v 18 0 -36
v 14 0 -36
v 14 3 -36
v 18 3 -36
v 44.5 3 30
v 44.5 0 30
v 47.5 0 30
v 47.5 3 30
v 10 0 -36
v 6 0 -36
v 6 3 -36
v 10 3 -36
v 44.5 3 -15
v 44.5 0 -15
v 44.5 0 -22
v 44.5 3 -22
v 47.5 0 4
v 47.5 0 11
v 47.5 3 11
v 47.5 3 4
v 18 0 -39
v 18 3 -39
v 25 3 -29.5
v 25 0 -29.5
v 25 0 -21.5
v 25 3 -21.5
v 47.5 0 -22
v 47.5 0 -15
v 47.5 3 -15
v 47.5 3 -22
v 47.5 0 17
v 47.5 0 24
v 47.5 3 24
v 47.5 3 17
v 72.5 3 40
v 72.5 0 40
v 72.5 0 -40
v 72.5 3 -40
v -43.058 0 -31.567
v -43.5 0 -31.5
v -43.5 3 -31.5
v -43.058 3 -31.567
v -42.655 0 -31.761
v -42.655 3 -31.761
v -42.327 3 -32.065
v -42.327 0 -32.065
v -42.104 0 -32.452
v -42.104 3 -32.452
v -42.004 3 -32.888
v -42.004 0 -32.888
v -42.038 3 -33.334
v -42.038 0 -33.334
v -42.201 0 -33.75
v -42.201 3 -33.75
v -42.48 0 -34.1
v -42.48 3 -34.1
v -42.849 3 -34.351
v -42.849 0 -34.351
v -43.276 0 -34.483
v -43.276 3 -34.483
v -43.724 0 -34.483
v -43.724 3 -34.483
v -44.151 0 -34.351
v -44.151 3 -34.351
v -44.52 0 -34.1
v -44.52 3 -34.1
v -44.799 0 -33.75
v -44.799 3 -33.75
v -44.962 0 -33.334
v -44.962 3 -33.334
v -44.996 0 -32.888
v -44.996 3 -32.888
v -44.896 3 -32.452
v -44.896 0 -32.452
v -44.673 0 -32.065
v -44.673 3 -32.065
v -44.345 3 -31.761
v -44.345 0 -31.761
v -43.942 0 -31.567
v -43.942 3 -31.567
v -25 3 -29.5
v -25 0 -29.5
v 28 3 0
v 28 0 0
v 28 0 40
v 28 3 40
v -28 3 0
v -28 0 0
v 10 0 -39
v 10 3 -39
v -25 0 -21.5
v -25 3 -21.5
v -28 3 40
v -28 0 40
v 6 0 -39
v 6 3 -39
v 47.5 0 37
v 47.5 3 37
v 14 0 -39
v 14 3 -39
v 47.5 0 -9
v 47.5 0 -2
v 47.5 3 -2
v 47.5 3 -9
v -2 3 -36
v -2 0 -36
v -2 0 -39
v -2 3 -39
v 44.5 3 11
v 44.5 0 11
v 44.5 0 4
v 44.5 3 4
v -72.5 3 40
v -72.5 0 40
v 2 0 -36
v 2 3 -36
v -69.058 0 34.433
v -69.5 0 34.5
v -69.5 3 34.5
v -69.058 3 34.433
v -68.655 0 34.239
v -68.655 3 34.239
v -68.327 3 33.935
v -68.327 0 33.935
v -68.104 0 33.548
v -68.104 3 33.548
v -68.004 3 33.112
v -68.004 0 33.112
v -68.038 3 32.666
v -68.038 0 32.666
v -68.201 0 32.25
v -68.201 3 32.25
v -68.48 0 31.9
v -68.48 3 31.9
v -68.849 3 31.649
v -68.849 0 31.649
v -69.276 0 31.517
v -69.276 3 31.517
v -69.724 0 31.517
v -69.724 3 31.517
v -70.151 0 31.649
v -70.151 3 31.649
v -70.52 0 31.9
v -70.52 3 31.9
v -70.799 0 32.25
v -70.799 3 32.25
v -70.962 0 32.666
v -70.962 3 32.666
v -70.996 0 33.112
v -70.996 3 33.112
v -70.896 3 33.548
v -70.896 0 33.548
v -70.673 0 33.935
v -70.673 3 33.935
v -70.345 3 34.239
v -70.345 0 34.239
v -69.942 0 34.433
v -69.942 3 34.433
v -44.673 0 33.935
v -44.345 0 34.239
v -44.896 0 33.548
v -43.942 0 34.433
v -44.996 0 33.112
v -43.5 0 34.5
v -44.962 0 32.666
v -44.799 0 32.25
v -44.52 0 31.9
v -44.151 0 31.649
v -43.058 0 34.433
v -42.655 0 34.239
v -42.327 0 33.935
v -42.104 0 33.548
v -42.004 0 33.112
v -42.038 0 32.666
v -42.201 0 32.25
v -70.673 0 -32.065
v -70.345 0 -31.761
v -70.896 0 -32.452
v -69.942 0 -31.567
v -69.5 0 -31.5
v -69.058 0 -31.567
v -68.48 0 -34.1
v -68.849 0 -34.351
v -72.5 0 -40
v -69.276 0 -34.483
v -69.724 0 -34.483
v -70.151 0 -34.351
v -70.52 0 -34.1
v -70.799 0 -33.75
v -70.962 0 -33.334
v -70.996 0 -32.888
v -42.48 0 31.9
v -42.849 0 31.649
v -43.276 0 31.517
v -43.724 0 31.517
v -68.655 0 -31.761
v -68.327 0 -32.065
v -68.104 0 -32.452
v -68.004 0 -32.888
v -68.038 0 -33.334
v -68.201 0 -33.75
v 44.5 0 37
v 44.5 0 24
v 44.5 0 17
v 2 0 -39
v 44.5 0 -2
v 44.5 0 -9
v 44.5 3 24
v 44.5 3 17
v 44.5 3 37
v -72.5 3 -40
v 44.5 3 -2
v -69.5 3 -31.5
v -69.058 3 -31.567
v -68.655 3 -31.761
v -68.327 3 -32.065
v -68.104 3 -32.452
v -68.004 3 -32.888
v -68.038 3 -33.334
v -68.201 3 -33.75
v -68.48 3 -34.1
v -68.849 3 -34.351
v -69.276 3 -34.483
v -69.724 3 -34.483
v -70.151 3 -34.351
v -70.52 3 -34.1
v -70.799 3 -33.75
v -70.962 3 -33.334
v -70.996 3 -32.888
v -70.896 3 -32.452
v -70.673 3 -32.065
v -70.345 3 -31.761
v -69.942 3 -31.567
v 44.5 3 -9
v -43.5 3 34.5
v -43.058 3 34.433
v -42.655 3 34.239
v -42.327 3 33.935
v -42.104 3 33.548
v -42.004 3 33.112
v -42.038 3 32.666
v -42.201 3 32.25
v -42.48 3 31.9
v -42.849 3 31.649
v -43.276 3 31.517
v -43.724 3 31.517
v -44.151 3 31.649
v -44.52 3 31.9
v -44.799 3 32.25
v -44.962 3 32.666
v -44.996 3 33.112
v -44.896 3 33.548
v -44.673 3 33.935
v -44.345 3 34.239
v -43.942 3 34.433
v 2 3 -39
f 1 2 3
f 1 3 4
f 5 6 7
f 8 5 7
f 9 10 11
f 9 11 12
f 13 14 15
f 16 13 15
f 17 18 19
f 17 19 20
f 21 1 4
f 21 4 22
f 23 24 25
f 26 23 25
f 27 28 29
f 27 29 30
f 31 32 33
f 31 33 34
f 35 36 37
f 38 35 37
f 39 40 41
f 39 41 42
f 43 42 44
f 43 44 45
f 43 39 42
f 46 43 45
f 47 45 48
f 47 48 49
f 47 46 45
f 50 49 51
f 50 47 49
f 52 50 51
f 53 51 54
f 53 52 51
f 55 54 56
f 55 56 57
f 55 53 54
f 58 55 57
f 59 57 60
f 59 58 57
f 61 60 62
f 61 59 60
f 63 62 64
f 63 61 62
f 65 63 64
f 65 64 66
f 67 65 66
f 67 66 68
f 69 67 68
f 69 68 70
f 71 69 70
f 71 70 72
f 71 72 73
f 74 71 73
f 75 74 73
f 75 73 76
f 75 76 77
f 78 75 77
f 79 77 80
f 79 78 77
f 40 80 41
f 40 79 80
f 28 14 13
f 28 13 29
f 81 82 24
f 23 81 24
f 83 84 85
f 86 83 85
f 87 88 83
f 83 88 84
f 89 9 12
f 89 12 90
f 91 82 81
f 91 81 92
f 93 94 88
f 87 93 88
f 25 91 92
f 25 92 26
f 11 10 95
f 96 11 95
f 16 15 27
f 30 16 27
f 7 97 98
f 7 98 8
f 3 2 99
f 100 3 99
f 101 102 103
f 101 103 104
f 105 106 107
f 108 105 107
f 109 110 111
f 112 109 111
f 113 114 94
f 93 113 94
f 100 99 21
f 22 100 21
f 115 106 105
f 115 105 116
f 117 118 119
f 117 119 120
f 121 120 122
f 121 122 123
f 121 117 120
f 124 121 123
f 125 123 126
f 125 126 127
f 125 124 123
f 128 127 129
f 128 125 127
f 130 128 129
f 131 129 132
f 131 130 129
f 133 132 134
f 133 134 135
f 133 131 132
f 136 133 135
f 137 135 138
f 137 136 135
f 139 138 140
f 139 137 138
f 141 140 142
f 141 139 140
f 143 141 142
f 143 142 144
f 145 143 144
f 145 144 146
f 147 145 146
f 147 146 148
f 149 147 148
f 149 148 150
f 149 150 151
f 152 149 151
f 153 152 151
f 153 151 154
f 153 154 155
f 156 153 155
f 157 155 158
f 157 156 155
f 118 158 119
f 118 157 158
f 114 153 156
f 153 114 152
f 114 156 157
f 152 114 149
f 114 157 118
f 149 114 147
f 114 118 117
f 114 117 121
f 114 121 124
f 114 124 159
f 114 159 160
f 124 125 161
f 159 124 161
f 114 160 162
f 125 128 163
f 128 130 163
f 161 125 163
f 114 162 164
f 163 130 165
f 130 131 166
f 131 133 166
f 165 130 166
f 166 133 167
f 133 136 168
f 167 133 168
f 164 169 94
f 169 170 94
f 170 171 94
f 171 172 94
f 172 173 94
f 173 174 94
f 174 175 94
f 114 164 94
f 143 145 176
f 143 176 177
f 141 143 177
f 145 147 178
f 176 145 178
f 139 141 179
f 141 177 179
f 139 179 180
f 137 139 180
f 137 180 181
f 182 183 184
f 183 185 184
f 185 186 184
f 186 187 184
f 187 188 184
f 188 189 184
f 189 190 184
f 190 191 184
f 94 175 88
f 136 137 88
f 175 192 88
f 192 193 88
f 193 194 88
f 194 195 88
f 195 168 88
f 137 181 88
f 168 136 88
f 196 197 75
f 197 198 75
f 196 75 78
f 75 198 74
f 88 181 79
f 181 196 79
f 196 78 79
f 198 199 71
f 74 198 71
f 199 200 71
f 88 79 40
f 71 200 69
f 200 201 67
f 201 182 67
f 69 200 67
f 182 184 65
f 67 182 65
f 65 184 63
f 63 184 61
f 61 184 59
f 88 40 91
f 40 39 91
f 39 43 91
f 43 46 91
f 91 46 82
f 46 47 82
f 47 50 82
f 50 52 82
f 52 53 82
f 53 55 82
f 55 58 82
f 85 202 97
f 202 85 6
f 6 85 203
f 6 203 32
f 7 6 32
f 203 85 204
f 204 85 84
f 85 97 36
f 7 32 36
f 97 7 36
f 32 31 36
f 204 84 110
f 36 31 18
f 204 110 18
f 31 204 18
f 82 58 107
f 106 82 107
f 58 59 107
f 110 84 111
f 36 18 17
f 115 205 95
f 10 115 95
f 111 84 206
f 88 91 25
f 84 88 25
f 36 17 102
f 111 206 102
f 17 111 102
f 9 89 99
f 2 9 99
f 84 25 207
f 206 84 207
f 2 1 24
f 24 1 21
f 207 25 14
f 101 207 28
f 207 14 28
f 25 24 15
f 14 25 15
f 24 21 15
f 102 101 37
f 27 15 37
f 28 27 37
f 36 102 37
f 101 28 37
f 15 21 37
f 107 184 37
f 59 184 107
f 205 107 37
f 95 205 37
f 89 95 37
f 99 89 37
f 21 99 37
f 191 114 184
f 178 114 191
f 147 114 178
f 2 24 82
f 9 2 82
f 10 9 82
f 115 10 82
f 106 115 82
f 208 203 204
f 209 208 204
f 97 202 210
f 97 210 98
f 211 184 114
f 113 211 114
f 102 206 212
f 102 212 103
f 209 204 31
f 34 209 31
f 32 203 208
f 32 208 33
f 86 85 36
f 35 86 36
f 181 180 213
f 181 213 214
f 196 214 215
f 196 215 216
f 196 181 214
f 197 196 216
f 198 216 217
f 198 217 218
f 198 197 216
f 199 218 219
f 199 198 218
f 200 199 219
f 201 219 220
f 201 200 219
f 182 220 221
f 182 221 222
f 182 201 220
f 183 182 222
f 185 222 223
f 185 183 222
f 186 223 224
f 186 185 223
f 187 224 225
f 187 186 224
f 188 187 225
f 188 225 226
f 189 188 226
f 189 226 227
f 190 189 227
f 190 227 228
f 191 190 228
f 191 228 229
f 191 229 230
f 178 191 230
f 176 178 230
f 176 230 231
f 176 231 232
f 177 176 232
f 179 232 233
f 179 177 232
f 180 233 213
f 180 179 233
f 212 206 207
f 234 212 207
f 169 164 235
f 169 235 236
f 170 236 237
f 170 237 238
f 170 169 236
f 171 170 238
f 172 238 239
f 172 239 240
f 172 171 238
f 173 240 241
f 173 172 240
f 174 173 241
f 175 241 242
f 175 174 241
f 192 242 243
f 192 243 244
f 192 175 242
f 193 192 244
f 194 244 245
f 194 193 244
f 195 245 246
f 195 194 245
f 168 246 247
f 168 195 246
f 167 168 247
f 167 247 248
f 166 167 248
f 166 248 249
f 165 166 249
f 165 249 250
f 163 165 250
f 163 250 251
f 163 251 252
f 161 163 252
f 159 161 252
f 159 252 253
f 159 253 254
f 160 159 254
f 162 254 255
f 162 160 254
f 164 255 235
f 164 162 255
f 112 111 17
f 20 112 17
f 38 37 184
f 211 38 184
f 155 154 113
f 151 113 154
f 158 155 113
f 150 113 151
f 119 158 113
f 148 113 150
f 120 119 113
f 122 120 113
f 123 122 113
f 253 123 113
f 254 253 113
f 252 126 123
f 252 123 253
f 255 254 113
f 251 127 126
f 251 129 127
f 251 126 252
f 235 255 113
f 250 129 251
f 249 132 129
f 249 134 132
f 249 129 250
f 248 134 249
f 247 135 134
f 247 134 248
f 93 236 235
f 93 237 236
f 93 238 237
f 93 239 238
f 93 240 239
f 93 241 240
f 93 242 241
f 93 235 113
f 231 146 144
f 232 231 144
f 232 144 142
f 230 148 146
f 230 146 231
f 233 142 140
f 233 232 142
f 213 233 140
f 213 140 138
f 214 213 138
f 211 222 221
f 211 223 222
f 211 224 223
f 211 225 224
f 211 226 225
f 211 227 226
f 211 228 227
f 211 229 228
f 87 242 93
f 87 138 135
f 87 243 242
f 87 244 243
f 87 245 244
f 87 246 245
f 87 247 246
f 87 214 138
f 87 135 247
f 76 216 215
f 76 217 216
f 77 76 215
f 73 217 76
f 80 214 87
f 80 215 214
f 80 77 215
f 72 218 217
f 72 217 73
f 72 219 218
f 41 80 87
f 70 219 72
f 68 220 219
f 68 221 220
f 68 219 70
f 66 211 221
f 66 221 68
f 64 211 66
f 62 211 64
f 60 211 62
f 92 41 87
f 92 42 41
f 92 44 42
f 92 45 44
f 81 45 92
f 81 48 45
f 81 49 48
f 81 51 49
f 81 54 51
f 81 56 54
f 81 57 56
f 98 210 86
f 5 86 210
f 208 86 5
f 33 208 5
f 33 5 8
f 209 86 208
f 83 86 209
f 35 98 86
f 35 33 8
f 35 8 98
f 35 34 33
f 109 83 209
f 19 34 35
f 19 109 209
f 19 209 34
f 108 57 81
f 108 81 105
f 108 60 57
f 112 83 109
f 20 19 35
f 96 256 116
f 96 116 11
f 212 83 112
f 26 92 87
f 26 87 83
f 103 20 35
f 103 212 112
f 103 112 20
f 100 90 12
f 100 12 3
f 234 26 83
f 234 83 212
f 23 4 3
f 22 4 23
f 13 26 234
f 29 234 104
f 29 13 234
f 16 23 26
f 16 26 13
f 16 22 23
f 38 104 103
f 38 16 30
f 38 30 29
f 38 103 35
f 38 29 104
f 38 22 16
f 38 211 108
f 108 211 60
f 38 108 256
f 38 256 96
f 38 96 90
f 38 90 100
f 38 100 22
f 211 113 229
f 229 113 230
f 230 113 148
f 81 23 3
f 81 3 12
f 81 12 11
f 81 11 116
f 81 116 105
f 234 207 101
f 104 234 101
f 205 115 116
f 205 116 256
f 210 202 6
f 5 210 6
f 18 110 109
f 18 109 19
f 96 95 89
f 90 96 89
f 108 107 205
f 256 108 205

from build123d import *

# Parameters (mm, degrees)
SKETCH1_R           = 1.5
SKETCH1_W           = 3
SKETCH1_H           = 7
SKETCH1_W_2         = 4
SKETCH1_H_2         = 3
BOSS_EXTRUDE1_DEPTH = 3
SKETCH5_W           = 50
SKETCH5_H           = 8
CUT_EXTRUDE1_DEPTH  = 10


with BuildPart() as part:
    # Sketch1 → Boss-Extrude1 (new body)
    with BuildSketch(Plane(origin=(0, 0, 0), x_dir=(1, 0, 0), z_dir=(0, 1, 0))):
        Polygon((-72.5, -40), (-28, -40), (-28, 0), (28, 0), (28, -40), (72.5, -40), (72.5, 40), (-72.5, 40), align=None)
        with Locations(Location((-69.5, 33, 0), (0, 0, 270))):
            Circle(SKETCH1_R, mode=Mode.SUBTRACT)
        with Locations(Location((-43.5, 33, 0), (0, 0, 270))):
            Circle(SKETCH1_R, mode=Mode.SUBTRACT)
        with Locations(Location((-43.5, -33, 0), (0, 0, 270))):
            Circle(SKETCH1_R, mode=Mode.SUBTRACT)
        with Locations(Location((-69.5, -33, 0), (0, 0, 270))):
            Circle(SKETCH1_R, mode=Mode.SUBTRACT)
        with Locations((46, 5.5)):
            Rectangle(SKETCH1_W, SKETCH1_H, mode=Mode.SUBTRACT)
        with Locations((46, 18.5)):
            Rectangle(SKETCH1_W, SKETCH1_H, mode=Mode.SUBTRACT)
        with Locations((46, -7.5)):
            Rectangle(SKETCH1_W, SKETCH1_H, mode=Mode.SUBTRACT)
        with Locations((46, -20.5)):
            Rectangle(SKETCH1_W, SKETCH1_H, mode=Mode.SUBTRACT)
        with Locations((46, -33.5)):
            Rectangle(SKETCH1_W, SKETCH1_H, mode=Mode.SUBTRACT)
        with Locations((0, 37.5)):
            Rectangle(SKETCH1_W_2, SKETCH1_H_2, mode=Mode.SUBTRACT)
        with Locations((8, 37.5)):
            Rectangle(SKETCH1_W_2, SKETCH1_H_2, mode=Mode.SUBTRACT)
        with Locations((16, 37.5)):
            Rectangle(SKETCH1_W_2, SKETCH1_H_2, mode=Mode.SUBTRACT)
    extrude(amount=BOSS_EXTRUDE1_DEPTH)

    # Sketch5 → Cut-Extrude1 (cut)
    with BuildSketch(Plane.XZ):
        with Locations((0, -25.5)):
            Rectangle(SKETCH5_W, SKETCH5_H)
    extrude(amount=-CUT_EXTRUDE1_DEPTH, mode=Mode.SUBTRACT)


solid = part.part
